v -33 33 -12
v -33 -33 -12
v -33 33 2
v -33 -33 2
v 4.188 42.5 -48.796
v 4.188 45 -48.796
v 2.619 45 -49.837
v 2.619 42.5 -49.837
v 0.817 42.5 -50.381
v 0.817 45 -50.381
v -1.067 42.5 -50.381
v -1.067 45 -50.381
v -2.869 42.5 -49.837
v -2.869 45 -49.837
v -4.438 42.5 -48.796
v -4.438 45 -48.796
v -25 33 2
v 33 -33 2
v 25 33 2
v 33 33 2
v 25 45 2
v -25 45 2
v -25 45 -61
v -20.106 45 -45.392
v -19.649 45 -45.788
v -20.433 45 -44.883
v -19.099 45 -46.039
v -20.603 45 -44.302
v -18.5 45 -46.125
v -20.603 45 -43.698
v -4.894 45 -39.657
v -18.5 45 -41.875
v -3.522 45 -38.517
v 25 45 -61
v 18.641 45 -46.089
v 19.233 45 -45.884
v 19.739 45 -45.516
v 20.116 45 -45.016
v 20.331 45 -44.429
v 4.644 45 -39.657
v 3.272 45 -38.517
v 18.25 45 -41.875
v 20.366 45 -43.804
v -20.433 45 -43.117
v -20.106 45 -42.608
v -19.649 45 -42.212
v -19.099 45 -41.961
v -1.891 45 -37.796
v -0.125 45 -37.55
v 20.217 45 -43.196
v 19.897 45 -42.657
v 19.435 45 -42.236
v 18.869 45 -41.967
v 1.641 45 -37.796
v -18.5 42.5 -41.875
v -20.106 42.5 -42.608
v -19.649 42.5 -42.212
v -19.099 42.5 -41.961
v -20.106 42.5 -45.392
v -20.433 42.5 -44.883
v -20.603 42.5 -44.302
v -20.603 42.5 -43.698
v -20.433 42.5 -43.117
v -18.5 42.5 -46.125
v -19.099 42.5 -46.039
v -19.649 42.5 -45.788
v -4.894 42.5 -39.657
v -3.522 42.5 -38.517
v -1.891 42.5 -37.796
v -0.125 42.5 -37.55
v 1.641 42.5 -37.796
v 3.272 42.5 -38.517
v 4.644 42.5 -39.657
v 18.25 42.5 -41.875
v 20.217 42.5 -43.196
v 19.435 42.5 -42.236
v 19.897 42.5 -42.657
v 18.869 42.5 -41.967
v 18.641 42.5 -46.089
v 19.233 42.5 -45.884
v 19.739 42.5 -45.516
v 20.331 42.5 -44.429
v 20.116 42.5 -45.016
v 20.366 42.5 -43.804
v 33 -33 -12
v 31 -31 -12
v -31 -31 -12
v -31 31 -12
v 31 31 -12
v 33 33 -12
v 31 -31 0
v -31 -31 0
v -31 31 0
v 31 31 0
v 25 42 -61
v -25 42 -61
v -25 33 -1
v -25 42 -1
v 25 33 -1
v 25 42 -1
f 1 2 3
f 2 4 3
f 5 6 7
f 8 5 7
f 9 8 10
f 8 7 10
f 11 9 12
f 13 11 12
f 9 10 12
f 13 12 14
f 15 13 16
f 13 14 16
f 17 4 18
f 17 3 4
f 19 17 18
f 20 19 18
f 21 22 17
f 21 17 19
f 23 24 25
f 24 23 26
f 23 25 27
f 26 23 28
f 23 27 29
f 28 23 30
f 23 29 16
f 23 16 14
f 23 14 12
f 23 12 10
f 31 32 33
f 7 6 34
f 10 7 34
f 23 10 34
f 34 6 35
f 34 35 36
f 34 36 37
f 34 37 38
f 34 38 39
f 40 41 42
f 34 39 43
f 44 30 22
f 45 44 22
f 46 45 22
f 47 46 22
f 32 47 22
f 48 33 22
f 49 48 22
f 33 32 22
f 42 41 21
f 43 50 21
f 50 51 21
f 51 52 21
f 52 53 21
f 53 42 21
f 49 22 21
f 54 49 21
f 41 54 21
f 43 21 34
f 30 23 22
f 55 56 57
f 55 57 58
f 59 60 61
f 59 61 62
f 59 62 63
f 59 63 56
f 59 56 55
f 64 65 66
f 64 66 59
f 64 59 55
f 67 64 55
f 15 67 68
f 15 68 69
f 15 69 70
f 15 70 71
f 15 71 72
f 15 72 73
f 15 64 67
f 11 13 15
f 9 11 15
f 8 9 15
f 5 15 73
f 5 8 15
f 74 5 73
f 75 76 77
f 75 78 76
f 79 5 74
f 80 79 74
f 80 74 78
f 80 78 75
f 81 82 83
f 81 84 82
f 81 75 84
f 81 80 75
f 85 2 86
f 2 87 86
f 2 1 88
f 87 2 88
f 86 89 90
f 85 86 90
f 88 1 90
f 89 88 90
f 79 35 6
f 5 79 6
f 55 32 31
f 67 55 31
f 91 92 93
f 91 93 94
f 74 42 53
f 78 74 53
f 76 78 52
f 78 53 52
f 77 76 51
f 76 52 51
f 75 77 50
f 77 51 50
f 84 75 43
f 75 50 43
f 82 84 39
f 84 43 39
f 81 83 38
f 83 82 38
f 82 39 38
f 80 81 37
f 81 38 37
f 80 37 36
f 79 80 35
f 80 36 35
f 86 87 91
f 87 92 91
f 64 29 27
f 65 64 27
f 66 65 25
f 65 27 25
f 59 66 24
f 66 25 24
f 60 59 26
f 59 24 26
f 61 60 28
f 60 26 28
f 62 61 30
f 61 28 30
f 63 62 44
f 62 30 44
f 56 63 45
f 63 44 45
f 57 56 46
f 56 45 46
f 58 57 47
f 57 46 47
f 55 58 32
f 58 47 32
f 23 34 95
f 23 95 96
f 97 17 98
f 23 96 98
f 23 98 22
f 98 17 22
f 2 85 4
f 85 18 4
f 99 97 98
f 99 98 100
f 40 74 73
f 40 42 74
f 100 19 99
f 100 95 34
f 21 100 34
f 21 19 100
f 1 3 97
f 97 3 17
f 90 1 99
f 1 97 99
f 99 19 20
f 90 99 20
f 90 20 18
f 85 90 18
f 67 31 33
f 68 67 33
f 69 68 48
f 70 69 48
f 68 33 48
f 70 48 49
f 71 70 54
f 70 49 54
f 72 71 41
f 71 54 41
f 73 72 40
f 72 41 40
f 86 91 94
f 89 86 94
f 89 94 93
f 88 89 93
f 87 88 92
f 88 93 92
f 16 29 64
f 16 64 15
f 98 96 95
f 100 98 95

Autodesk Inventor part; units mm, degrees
ref_plane "YZ Plane" through (0, 0, 0) normal (1, 0, 0) x (0, 1, 0)
ref_plane "XZ Plane" through (0, 0, 0) normal (0, 1, 0) x (-1, 0, 0)
ref_plane "XY Plane" through (0, 0, 0) normal (0, 0, 1) x (1, 0, 0)
sketch "Sketch1" plane through (0, 0, 0) normal (0, 0, 1) x (1, 0, 0)
  line L0 (-31, -31) -> (31, -31)
  line L1 (31, -31) -> (31, 31)
  line L2 (31, 31) -> (-31, 31)
  line L3 (-31, 31) -> (-31, -31)
  line L4 (-31, -31) -> (31, 31) construction
  line L5 (31, -31) -> (-31, 31) construction
  line L6 (-33, 33) -> (33, 33)
  line L7 (33, 33) -> (33, -33)
  line L8 (33, -33) -> (-33, -33)
  line L9 (-33, -33) -> (-33, 33)
  point P0 (0, 0)
  dimension "d0" = 62
  dimension "d1" = 62
  dimension "d2" = 2
extrude "Extrusion1" add sketch "Sketch1" along normal blind 2 contours L3 L2 L1 L0 | L6 L7 L8 L9
extrude "Extrusion2" add sketch "Sketch1" against normal blind 12
sketch "Sketch2" plane through (-33, 33, 2) normal (0, 1, 0) x (1, 0, 0)
  line L0 (8, 3) -> (58, 3)
  line L1 (58, 3) -> (58, 0)
  line L2 (58, 0) -> (8, 0)
  line L3 (8, 0) -> (8, 3)
  line L4 (0, 14) -> (0, 0) projected
  line L5 (0, 14) -> (66, 14) projected
  point P0 (33, 2)
  dimension "d7" = 50
  dimension "d8" = 3
  dimension "d9" = 8
  dimension "d10" = 11
extrude "Extrusion3" add sketch "Sketch2" along normal blind 12
sketch "Sketch3" plane through (25, 33, -1) normal (0, 0, -1) x (-1, 0, 0)
  line L0 (50, 12) -> (0, 12) projected
  line L1 (50, 0) -> (50, 12) projected
  line L2 (0, 12) -> (50, 12)
  line L3 (50, 12) -> (50, 9)
  line L4 (50, 9) -> (0, 9)
  line L5 (0, 9) -> (0, 12)
  point P0 (25, -33)
  dimension "d13" = 3
extrude "Extrusion4" add sketch "Sketch3" along normal blind 60
sketch "Sketch7" plane through (-33, 45, 2) normal (0, 1, 0) x (1, 0, 0)
  circle A0 centre (32.875, 46) radius 6.45
  circle A1 centre (14.5, 46) radius 2.125
  circle A2 centre (51.25, 46) radius 2.125
  line L0 (14.5, 46) -> (32.875, 46)
  line L1 (32.875, 46) -> (51.25, 46)
  line L2 (51.6412, 48.0887) -> (37.1884, 50.7955)
  line L3 (51.25, 43.875) -> (37.6436, 41.6569)
  line L4 (14.5, 43.875) -> (28.1064, 41.6569)
  line L5 (14.5, 48.125) -> (28.5616, 50.7955)
  line L6 (58, 0) -> (58, 63) projected
  line L7 (8, 63) -> (58, 63) projected
  point P0 (33, 2)
  dimension "d34" = 12.9
  dimension "d35" = 4.25
  dimension "d36" = 4.25
  dimension "d37" = 41
  dimension "d38" = 9.15
  dimension "d39" = 6.75
  dimension "d40" = 17
extrude "Extrusion8" cut sketch "Sketch7" against normal blind 2.5
properties part number "pan_base_holder_third_v2"
